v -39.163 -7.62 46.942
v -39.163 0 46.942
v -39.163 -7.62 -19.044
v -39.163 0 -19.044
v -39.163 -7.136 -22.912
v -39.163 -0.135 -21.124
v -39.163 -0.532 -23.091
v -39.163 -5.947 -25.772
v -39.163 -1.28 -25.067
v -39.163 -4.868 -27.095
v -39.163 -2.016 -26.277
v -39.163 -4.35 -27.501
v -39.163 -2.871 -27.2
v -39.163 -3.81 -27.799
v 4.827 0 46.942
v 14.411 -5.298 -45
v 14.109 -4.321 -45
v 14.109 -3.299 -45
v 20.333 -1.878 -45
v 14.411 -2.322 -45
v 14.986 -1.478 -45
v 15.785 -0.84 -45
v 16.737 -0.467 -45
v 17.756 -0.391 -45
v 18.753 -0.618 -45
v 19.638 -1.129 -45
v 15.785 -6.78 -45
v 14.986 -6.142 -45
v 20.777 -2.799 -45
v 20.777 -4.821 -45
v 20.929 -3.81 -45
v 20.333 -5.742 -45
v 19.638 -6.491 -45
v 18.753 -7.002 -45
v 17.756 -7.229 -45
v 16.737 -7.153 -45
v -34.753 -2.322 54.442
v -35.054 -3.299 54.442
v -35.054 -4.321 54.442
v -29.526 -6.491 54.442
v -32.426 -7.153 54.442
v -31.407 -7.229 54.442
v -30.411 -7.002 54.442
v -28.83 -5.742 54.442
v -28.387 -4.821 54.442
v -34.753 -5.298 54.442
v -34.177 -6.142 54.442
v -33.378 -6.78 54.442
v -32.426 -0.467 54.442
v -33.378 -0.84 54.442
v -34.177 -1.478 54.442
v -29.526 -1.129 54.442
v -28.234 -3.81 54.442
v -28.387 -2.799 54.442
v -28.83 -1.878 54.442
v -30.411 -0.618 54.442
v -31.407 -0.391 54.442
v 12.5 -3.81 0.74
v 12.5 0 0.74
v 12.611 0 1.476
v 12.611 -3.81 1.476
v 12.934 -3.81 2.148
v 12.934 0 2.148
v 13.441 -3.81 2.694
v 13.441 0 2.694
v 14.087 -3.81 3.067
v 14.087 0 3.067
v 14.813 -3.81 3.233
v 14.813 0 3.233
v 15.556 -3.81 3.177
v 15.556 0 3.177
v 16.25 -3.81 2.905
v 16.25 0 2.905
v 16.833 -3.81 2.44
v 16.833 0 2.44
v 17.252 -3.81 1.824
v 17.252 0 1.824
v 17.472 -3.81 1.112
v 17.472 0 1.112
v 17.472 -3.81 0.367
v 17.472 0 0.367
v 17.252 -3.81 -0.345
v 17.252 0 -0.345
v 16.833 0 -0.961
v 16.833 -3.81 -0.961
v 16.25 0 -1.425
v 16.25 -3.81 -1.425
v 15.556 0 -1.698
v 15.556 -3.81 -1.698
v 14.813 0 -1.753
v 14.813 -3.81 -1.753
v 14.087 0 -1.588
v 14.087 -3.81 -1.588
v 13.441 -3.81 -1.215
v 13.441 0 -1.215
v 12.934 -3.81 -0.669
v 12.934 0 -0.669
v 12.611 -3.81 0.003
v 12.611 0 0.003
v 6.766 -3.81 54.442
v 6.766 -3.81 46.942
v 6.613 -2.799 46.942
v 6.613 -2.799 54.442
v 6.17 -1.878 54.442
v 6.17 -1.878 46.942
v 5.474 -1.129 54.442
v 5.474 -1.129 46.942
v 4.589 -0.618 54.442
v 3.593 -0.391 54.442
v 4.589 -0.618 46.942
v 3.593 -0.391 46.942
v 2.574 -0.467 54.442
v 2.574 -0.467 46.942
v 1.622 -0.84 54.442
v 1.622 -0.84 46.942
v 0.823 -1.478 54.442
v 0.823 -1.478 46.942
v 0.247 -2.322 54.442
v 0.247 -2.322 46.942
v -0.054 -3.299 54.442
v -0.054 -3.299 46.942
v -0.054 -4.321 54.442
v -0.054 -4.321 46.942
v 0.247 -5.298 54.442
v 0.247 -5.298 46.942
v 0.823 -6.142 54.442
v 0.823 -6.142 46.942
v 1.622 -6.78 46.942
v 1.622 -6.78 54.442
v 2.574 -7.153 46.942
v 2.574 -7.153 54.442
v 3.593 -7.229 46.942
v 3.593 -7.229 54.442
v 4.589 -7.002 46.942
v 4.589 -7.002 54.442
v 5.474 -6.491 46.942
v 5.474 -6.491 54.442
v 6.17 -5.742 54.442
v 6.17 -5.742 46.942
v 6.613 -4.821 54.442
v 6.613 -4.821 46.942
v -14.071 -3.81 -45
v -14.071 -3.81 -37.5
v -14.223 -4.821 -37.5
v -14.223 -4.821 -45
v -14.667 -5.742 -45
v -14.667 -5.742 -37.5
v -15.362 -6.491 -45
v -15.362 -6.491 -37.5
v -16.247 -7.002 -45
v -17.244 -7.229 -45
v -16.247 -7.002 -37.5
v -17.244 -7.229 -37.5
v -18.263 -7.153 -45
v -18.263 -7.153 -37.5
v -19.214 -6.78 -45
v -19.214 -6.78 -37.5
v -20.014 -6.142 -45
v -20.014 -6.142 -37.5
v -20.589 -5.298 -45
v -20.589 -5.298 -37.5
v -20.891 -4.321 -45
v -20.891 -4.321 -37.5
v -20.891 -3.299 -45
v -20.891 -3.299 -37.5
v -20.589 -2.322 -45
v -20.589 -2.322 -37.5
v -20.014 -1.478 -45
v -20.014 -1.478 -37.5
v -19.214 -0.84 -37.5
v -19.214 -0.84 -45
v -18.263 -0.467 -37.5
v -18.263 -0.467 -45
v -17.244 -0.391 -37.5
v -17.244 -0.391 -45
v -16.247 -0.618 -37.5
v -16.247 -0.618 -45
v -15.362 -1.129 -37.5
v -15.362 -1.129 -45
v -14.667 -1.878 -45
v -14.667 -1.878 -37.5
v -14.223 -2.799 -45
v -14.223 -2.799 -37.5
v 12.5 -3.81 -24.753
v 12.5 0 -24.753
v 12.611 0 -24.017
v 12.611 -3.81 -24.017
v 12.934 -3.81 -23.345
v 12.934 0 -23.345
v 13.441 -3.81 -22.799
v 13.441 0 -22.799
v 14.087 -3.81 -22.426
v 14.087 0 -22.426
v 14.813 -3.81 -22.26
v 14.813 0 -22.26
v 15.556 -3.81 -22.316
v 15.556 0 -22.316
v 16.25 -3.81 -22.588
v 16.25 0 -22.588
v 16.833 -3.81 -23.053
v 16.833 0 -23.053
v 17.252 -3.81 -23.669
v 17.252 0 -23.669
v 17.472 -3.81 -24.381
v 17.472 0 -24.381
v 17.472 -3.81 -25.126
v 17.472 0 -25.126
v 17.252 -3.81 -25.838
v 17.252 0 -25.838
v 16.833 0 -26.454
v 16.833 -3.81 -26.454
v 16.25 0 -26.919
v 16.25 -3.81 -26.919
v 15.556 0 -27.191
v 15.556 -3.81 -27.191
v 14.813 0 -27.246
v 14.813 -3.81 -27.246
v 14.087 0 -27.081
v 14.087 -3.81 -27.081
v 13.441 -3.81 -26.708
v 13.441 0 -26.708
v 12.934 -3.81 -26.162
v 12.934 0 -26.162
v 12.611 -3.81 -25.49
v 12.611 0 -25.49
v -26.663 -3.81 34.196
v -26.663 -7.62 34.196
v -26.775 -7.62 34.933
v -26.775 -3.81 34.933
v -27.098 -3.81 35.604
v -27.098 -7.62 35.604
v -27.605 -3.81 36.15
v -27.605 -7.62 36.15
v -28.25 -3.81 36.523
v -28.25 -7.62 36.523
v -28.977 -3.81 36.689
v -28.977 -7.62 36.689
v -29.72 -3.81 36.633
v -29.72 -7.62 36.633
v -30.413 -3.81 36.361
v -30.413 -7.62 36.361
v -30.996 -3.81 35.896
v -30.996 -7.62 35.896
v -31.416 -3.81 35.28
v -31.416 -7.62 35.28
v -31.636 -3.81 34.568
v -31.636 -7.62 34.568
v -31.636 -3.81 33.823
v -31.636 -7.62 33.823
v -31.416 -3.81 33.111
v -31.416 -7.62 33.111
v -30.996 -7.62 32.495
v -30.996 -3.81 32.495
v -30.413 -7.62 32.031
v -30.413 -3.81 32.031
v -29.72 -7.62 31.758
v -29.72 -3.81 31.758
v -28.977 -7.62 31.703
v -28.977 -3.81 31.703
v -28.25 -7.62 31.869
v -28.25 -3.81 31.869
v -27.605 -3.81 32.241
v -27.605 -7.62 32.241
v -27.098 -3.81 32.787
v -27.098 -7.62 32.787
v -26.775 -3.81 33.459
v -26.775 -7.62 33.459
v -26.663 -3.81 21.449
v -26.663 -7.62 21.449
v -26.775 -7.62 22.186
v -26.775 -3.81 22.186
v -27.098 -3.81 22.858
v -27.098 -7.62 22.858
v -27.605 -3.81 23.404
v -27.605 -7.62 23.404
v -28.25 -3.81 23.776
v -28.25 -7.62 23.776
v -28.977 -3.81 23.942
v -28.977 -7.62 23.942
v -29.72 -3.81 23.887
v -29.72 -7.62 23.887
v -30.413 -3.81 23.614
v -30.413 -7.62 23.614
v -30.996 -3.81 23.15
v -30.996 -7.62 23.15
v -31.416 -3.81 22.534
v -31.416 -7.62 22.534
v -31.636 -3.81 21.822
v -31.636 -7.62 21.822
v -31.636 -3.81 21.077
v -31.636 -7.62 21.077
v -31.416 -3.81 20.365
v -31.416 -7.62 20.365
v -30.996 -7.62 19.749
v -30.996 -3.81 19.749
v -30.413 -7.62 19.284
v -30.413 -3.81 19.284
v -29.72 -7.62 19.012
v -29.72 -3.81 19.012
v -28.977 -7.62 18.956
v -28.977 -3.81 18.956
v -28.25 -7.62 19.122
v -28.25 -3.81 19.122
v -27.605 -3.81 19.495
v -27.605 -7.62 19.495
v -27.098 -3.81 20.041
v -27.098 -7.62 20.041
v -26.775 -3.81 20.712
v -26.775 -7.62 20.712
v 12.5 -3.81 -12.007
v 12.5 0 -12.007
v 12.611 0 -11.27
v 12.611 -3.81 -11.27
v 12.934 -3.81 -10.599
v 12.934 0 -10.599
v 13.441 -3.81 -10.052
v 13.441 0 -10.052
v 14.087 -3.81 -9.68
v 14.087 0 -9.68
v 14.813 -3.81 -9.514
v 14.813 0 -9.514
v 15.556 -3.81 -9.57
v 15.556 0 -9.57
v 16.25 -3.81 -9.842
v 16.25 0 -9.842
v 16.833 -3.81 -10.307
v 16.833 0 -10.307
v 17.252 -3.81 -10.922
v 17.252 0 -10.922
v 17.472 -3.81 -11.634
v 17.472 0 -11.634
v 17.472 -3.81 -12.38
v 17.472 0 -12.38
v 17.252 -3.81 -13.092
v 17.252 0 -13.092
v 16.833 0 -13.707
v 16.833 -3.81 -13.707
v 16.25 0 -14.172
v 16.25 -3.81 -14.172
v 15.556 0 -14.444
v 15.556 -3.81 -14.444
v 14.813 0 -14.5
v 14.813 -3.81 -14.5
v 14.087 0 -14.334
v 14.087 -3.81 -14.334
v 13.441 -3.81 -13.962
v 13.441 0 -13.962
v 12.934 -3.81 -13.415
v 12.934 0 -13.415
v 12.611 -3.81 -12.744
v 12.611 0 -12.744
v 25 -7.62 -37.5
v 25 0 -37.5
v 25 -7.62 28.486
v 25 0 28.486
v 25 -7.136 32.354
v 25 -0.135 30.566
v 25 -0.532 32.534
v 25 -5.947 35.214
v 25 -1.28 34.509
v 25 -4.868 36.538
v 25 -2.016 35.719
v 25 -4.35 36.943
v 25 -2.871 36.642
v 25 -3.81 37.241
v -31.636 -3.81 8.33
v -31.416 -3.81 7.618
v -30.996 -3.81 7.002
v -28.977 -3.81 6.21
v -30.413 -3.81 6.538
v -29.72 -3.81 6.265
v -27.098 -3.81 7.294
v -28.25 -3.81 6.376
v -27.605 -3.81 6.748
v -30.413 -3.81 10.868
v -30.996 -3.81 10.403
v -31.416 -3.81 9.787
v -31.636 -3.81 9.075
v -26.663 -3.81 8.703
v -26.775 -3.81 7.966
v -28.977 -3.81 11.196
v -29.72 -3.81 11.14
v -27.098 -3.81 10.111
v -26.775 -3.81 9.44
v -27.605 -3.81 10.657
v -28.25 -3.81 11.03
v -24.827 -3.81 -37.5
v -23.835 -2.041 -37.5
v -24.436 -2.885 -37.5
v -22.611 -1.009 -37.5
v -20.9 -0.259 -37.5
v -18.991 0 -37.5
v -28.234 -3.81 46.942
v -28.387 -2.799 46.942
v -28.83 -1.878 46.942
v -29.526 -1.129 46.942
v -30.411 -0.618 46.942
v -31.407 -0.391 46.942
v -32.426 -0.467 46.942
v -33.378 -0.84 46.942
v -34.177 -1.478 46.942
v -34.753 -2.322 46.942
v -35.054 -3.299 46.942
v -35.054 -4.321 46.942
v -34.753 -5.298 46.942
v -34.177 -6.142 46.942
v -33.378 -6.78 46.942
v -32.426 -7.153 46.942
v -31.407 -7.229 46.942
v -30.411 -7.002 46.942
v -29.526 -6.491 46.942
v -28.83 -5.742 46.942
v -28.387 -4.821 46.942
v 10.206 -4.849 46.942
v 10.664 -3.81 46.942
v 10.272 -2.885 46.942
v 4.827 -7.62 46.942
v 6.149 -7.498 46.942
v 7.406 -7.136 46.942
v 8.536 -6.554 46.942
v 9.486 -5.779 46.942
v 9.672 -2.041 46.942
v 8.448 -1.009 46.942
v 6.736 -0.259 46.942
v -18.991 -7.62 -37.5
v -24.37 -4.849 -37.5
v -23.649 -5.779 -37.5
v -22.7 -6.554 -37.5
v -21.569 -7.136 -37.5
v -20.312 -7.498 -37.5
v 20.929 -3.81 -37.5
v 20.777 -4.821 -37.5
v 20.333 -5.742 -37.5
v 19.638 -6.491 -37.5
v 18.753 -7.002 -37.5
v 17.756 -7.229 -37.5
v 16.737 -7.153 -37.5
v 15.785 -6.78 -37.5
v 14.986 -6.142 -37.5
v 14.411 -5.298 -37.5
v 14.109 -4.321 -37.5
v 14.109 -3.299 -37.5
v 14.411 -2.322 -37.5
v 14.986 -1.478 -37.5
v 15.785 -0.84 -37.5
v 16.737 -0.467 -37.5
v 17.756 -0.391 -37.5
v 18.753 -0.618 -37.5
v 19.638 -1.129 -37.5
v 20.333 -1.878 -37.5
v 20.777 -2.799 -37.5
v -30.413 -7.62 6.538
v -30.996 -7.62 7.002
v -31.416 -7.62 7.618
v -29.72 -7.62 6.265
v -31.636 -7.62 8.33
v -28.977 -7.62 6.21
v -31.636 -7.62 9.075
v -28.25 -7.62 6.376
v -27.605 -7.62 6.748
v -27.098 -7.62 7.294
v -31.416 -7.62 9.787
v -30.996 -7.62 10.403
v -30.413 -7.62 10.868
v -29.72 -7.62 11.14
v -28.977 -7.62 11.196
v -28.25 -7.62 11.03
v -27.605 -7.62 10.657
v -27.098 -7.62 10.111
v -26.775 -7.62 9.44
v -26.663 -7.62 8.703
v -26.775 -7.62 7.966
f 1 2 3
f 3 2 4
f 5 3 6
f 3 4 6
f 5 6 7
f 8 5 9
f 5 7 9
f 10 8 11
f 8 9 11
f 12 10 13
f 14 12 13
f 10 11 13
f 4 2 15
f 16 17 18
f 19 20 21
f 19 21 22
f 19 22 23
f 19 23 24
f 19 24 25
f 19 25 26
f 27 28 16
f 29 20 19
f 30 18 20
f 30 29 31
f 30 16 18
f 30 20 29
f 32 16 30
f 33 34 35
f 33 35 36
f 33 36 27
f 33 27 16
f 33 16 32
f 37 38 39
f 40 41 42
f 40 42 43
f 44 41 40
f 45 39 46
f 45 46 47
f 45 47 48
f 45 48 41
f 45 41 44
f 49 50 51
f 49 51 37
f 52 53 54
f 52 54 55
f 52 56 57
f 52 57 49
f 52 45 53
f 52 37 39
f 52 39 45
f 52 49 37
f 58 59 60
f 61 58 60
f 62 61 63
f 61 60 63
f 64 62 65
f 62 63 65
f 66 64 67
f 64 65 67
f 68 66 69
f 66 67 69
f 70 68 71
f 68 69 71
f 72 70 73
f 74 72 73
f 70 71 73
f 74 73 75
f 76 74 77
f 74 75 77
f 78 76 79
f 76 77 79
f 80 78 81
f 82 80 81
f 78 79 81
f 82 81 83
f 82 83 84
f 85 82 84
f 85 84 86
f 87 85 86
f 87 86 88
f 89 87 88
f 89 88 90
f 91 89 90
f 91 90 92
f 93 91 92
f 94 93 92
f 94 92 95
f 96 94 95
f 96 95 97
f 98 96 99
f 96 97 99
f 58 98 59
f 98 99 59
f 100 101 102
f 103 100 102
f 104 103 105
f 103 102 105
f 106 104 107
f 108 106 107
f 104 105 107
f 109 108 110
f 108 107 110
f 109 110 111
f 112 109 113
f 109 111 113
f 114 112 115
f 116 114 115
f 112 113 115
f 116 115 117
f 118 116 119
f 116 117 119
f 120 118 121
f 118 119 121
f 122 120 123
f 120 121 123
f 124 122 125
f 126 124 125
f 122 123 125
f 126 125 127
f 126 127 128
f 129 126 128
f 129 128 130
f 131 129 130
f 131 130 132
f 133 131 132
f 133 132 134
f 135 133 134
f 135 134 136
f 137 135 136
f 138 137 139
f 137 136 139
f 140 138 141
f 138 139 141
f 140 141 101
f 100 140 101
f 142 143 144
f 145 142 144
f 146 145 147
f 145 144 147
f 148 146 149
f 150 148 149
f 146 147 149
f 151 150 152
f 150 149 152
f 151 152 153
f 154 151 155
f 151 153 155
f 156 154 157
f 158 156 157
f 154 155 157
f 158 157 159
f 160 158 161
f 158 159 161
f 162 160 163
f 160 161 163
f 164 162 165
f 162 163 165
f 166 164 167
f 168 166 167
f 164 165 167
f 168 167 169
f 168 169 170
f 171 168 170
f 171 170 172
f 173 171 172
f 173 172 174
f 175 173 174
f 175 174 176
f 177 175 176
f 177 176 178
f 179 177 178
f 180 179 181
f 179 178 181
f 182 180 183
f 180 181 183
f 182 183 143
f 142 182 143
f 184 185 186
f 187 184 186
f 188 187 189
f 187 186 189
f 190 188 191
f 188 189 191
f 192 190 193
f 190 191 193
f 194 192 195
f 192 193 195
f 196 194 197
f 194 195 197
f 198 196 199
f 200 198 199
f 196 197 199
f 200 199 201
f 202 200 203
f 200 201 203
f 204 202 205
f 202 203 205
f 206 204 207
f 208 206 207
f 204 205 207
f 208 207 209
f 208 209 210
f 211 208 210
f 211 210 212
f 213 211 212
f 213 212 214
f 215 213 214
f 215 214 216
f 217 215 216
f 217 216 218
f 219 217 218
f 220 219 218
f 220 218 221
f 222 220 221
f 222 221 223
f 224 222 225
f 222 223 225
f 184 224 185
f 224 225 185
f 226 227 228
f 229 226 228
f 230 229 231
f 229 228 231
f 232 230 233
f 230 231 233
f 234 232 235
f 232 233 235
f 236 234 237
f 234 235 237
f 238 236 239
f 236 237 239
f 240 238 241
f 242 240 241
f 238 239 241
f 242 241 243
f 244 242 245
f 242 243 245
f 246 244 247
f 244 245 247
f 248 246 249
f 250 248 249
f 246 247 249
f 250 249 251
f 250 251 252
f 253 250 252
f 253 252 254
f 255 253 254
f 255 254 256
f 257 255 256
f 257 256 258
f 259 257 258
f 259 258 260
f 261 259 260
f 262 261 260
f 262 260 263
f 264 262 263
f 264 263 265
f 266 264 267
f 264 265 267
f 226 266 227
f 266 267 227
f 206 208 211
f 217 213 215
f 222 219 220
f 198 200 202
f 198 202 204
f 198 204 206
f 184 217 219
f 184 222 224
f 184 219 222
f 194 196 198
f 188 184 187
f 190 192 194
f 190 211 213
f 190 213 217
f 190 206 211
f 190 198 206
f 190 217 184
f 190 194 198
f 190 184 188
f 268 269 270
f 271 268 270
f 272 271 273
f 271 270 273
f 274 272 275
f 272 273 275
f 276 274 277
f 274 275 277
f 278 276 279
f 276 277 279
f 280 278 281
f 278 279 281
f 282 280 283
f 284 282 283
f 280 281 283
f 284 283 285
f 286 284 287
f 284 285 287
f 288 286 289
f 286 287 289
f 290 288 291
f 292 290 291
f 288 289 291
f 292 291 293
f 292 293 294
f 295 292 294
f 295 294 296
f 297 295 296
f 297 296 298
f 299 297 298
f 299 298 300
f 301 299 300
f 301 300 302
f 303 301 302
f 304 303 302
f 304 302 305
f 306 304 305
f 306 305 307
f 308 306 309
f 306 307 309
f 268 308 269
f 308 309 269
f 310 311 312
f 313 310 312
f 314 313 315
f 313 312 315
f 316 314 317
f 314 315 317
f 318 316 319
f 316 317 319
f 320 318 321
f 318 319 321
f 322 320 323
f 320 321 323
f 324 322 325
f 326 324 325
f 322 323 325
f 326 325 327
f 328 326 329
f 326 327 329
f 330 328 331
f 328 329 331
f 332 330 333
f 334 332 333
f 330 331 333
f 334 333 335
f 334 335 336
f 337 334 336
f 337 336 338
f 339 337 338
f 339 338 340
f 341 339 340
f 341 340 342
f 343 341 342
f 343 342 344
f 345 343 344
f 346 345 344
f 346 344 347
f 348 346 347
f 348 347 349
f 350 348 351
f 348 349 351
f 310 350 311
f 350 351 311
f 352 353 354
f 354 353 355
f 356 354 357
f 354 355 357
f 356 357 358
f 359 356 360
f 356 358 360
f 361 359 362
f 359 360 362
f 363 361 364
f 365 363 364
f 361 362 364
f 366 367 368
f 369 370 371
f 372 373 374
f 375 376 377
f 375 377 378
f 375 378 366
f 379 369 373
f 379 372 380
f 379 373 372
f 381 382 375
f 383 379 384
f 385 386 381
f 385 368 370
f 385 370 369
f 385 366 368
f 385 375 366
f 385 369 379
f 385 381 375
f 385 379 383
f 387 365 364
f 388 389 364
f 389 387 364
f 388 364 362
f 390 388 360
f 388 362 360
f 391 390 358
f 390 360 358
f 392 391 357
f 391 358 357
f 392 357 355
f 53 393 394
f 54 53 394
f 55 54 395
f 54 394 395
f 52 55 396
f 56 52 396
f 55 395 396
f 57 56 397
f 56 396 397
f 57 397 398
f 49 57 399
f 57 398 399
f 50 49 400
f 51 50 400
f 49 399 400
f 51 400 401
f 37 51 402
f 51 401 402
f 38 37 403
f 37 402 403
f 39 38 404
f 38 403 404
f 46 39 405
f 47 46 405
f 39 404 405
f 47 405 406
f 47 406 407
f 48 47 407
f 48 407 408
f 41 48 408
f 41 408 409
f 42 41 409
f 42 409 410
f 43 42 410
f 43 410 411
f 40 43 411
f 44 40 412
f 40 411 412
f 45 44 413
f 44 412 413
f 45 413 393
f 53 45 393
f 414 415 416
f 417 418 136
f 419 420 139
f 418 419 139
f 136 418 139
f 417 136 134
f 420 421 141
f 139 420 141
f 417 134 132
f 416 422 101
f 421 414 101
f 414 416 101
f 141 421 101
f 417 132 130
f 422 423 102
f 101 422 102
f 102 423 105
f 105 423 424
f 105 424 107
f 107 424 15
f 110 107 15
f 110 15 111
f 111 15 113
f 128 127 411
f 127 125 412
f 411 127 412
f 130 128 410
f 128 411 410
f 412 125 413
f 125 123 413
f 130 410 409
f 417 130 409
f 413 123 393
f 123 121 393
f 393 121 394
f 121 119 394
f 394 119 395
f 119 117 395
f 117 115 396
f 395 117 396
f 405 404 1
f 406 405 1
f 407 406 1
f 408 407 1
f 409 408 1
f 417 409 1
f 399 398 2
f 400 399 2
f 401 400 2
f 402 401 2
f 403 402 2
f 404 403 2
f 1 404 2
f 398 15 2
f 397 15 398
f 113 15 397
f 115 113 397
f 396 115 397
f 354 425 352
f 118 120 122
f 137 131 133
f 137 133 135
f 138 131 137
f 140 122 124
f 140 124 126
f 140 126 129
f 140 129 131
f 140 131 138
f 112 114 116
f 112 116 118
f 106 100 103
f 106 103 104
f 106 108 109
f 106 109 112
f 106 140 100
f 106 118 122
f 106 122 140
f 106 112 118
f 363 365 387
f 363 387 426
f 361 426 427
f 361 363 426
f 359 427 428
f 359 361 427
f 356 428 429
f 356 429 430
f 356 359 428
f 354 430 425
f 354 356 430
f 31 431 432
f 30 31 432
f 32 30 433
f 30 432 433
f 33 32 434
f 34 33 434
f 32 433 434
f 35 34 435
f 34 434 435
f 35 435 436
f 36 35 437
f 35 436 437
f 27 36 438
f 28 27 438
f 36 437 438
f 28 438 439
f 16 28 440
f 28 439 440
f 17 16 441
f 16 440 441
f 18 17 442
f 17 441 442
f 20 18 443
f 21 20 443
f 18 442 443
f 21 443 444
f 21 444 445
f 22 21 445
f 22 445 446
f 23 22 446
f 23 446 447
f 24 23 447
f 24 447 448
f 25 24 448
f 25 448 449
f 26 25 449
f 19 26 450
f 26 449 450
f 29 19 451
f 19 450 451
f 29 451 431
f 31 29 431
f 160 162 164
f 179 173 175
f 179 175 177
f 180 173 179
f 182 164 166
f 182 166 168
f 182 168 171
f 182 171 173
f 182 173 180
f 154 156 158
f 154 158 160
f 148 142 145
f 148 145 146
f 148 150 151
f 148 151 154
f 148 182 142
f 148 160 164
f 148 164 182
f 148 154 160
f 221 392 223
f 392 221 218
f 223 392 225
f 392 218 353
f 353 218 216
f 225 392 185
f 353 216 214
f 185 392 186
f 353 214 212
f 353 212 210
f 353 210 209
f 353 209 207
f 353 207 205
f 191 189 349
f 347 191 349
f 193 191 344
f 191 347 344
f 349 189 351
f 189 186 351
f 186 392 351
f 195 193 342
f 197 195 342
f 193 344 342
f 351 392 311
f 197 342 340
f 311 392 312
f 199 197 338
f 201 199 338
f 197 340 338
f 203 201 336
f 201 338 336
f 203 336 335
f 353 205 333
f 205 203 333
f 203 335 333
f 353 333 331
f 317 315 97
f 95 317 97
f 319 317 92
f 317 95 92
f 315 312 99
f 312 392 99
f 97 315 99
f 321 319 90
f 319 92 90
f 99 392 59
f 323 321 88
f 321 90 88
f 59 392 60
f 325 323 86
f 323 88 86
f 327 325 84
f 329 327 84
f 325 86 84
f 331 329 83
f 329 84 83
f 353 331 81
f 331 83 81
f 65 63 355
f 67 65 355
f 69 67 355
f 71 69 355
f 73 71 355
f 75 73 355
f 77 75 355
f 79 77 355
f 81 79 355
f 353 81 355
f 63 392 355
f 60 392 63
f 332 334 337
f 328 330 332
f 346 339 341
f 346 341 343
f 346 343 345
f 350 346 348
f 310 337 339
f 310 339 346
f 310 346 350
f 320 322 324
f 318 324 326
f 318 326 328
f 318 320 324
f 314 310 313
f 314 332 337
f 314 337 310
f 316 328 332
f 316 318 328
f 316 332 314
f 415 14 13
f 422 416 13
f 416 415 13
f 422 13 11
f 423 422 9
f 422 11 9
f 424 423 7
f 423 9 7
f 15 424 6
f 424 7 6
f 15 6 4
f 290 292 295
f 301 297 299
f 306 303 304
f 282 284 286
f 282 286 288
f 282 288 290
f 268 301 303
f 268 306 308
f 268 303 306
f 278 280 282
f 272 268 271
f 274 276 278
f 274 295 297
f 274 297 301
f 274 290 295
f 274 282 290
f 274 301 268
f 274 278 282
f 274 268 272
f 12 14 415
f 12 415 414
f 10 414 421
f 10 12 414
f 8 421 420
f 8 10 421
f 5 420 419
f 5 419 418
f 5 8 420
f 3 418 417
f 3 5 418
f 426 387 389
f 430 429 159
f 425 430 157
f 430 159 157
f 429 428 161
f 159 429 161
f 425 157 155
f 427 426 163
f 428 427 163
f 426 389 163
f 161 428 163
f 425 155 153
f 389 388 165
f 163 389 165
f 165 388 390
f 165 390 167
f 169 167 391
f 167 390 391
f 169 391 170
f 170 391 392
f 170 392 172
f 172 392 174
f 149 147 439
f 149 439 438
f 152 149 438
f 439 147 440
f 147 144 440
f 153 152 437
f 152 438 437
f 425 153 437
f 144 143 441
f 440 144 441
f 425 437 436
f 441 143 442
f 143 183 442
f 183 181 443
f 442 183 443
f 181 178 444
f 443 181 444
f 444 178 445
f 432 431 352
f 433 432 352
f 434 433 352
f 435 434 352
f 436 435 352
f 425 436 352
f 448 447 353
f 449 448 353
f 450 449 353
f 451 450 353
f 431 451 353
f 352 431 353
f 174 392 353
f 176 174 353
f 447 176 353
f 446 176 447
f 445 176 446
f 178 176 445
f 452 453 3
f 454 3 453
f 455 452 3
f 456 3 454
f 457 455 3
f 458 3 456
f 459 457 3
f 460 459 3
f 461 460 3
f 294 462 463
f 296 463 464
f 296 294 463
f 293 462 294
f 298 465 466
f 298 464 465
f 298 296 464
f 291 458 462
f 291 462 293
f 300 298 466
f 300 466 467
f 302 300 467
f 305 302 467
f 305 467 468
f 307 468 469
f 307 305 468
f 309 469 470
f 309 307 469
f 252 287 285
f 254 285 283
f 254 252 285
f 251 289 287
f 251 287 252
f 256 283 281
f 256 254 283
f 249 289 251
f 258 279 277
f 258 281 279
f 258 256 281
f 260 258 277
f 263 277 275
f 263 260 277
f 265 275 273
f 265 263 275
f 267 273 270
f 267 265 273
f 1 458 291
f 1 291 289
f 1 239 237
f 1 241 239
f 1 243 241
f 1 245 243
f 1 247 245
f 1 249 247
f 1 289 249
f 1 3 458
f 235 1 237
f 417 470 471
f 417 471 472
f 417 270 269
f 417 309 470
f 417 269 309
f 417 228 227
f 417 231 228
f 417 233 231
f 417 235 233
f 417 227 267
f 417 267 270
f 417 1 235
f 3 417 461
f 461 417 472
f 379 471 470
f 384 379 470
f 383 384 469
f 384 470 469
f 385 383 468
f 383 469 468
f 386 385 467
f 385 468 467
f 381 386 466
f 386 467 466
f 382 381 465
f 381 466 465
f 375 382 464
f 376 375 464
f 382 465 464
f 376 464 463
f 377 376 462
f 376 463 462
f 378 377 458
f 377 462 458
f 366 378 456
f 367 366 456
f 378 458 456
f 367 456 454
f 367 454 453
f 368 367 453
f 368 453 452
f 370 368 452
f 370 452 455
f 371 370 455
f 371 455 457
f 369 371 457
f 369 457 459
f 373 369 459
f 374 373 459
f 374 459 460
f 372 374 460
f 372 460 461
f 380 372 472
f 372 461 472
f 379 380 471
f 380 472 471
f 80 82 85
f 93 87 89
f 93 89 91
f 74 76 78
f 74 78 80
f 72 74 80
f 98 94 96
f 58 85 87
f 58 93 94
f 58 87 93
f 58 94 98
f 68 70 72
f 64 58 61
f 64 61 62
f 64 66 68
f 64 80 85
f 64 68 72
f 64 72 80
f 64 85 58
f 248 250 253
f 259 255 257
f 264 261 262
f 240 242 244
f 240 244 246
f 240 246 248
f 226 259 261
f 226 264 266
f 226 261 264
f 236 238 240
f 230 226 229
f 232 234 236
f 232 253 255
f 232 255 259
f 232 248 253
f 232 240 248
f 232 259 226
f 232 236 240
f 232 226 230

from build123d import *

# Parameters (mm, degrees)
F1_DEPTH      = 7.62
F2_R          = 3.429
F4_DEPTH      = 7.5
F3_R          = 3.429
F5_DEPTH      = 7.5
F6_T1_DEPTH   = 115.1387818866
F6_2_T1_DEPTH = 115.1387818866
F7_R          = 2.5
F9_DEPTH      = 3.81
F8_R          = 2.5
F10_DEPTH     = 3.81


# Not quite as in the source:
# - a fillet or chamfer that OpenCascade refuses, or shapes differently, is made with other operations: its cross-section is extruded or revolved along the edge and cut away or added


with BuildPart() as f1:
    # F0 (on Front) → F1 (new body)
    with BuildSketch(Plane.XZ):
        Polygon((25, 37.5), (-25, -37.5), (25, -37.5), align=None)
    extrude(amount=F1_DEPTH)

    # F3 (on face) → F5 (join)
    with BuildSketch(Plane(origin=(0, 0, -37.5), x_dir=(1, 0, 0), z_dir=(0, 0, -1))):
        with Locations((-17.5, 3.81)):
            Circle(F3_R)
        with Locations((17.5, 3.81)):
            Circle(F3_R)
    extrude(amount=F5_DEPTH)

    # F6: fillet of radius 5 on 2 edges, made by hand

    # F6_s2 → F6_t1 (cut)
    with BuildSketch(Plane(origin=(31.9337524528, 0, 47.9006286792), x_dir=(0, 1, 0), z_dir=(-0.5547001962, 0, -0.8320502943))):
        with BuildLine():
            ThreePointArc((-2.62, 0), (-6.1555339059, 1.4644660941), (-7.62, 5))
            Line((-7.62, 5), (-7.62, 0))
            Line((-7.62, 0), (-2.62, 0))
        make_face()
        with BuildLine():
            ThreePointArc((-5, 0), (-1.4644660941, 1.4644660941), (0, 5))
            Line((0, 5), (0, 0))
            Line((0, 0), (-5, 0))
        make_face()
    extrude(amount=F6_T1_DEPTH, mode=Mode.SUBTRACT)

    # F7 (on face) → F9 (cut)
    with BuildSketch(Plane(origin=(0, 0, 0), x_dir=(-1, 0, 0), z_dir=(0, 1, 0))):
        with Locations((-15, -24.7534695472)):
            Circle(F7_R)
        with Locations((-15, -12.0069390943)):
            Circle(F7_R)
        with Locations((-15, 0.7395913585)):
            Circle(F7_R)
    extrude(amount=-F9_DEPTH, mode=Mode.SUBTRACT)


with BuildPart() as f1b:
    # F0 (on Front) → F1, piece 2 (new body)
    with BuildSketch(Plane.XZ):
        Polygon((-39.1634743611, -28.0576837592), (10.8365256389, 46.9423162408), (-39.1634743611, 46.9423162408), align=None)
    extrude(amount=F1_DEPTH)

    # F2 (on face) → F4 (join)
    with BuildSketch(Plane.XY.offset(46.9423162408)):
        with Locations((-31.6634743611, -3.81)):
            Circle(F2_R)
        with Locations((3.3365256389, -3.81)):
            Circle(F2_R)
    extrude(amount=F4_DEPTH)

    # F6#2: fillet of radius 5 on 2 edges, made by hand

    # F6_2_s2 → F6_2_t1 (cut)
    with BuildSketch(Plane(origin=(-31.9337524528, 0, -47.9006286792), x_dir=(0, 1, 0), z_dir=(0.5547001962, 0, 0.8320502943))):
        with BuildLine():
            ThreePointArc((-5, 17.0223776826), (-1.4644660941, 18.4868437767), (0, 22.0223776826))
            Line((0, 22.0223776826), (0, 17.0223776826))
            Line((0, 17.0223776826), (-5, 17.0223776826))
        make_face()
        with BuildLine():
            ThreePointArc((-2.62, 17.0223776826), (-6.1555339059, 18.4868437767), (-7.62, 22.0223776826))
            Line((-7.62, 22.0223776826), (-7.62, 17.0223776826))
            Line((-7.62, 17.0223776826), (-2.62, 17.0223776826))
        make_face()
    extrude(amount=F6_2_T1_DEPTH, mode=Mode.SUBTRACT)

    # F8 (on face) → F10 (cut)
    with BuildSketch(Plane.XZ.offset(7.62)):
        with Locations((-29.1634743611, 8.7027248823)):
            Circle(F8_R)
        with Locations((-29.1634743611, 21.4492553351)):
            Circle(F8_R)
        with Locations((-29.1634743611, 34.1957857879)):
            Circle(F8_R)
    extrude(amount=-F10_DEPTH, mode=Mode.SUBTRACT)


solid = Compound([f1.part, f1b.part])
